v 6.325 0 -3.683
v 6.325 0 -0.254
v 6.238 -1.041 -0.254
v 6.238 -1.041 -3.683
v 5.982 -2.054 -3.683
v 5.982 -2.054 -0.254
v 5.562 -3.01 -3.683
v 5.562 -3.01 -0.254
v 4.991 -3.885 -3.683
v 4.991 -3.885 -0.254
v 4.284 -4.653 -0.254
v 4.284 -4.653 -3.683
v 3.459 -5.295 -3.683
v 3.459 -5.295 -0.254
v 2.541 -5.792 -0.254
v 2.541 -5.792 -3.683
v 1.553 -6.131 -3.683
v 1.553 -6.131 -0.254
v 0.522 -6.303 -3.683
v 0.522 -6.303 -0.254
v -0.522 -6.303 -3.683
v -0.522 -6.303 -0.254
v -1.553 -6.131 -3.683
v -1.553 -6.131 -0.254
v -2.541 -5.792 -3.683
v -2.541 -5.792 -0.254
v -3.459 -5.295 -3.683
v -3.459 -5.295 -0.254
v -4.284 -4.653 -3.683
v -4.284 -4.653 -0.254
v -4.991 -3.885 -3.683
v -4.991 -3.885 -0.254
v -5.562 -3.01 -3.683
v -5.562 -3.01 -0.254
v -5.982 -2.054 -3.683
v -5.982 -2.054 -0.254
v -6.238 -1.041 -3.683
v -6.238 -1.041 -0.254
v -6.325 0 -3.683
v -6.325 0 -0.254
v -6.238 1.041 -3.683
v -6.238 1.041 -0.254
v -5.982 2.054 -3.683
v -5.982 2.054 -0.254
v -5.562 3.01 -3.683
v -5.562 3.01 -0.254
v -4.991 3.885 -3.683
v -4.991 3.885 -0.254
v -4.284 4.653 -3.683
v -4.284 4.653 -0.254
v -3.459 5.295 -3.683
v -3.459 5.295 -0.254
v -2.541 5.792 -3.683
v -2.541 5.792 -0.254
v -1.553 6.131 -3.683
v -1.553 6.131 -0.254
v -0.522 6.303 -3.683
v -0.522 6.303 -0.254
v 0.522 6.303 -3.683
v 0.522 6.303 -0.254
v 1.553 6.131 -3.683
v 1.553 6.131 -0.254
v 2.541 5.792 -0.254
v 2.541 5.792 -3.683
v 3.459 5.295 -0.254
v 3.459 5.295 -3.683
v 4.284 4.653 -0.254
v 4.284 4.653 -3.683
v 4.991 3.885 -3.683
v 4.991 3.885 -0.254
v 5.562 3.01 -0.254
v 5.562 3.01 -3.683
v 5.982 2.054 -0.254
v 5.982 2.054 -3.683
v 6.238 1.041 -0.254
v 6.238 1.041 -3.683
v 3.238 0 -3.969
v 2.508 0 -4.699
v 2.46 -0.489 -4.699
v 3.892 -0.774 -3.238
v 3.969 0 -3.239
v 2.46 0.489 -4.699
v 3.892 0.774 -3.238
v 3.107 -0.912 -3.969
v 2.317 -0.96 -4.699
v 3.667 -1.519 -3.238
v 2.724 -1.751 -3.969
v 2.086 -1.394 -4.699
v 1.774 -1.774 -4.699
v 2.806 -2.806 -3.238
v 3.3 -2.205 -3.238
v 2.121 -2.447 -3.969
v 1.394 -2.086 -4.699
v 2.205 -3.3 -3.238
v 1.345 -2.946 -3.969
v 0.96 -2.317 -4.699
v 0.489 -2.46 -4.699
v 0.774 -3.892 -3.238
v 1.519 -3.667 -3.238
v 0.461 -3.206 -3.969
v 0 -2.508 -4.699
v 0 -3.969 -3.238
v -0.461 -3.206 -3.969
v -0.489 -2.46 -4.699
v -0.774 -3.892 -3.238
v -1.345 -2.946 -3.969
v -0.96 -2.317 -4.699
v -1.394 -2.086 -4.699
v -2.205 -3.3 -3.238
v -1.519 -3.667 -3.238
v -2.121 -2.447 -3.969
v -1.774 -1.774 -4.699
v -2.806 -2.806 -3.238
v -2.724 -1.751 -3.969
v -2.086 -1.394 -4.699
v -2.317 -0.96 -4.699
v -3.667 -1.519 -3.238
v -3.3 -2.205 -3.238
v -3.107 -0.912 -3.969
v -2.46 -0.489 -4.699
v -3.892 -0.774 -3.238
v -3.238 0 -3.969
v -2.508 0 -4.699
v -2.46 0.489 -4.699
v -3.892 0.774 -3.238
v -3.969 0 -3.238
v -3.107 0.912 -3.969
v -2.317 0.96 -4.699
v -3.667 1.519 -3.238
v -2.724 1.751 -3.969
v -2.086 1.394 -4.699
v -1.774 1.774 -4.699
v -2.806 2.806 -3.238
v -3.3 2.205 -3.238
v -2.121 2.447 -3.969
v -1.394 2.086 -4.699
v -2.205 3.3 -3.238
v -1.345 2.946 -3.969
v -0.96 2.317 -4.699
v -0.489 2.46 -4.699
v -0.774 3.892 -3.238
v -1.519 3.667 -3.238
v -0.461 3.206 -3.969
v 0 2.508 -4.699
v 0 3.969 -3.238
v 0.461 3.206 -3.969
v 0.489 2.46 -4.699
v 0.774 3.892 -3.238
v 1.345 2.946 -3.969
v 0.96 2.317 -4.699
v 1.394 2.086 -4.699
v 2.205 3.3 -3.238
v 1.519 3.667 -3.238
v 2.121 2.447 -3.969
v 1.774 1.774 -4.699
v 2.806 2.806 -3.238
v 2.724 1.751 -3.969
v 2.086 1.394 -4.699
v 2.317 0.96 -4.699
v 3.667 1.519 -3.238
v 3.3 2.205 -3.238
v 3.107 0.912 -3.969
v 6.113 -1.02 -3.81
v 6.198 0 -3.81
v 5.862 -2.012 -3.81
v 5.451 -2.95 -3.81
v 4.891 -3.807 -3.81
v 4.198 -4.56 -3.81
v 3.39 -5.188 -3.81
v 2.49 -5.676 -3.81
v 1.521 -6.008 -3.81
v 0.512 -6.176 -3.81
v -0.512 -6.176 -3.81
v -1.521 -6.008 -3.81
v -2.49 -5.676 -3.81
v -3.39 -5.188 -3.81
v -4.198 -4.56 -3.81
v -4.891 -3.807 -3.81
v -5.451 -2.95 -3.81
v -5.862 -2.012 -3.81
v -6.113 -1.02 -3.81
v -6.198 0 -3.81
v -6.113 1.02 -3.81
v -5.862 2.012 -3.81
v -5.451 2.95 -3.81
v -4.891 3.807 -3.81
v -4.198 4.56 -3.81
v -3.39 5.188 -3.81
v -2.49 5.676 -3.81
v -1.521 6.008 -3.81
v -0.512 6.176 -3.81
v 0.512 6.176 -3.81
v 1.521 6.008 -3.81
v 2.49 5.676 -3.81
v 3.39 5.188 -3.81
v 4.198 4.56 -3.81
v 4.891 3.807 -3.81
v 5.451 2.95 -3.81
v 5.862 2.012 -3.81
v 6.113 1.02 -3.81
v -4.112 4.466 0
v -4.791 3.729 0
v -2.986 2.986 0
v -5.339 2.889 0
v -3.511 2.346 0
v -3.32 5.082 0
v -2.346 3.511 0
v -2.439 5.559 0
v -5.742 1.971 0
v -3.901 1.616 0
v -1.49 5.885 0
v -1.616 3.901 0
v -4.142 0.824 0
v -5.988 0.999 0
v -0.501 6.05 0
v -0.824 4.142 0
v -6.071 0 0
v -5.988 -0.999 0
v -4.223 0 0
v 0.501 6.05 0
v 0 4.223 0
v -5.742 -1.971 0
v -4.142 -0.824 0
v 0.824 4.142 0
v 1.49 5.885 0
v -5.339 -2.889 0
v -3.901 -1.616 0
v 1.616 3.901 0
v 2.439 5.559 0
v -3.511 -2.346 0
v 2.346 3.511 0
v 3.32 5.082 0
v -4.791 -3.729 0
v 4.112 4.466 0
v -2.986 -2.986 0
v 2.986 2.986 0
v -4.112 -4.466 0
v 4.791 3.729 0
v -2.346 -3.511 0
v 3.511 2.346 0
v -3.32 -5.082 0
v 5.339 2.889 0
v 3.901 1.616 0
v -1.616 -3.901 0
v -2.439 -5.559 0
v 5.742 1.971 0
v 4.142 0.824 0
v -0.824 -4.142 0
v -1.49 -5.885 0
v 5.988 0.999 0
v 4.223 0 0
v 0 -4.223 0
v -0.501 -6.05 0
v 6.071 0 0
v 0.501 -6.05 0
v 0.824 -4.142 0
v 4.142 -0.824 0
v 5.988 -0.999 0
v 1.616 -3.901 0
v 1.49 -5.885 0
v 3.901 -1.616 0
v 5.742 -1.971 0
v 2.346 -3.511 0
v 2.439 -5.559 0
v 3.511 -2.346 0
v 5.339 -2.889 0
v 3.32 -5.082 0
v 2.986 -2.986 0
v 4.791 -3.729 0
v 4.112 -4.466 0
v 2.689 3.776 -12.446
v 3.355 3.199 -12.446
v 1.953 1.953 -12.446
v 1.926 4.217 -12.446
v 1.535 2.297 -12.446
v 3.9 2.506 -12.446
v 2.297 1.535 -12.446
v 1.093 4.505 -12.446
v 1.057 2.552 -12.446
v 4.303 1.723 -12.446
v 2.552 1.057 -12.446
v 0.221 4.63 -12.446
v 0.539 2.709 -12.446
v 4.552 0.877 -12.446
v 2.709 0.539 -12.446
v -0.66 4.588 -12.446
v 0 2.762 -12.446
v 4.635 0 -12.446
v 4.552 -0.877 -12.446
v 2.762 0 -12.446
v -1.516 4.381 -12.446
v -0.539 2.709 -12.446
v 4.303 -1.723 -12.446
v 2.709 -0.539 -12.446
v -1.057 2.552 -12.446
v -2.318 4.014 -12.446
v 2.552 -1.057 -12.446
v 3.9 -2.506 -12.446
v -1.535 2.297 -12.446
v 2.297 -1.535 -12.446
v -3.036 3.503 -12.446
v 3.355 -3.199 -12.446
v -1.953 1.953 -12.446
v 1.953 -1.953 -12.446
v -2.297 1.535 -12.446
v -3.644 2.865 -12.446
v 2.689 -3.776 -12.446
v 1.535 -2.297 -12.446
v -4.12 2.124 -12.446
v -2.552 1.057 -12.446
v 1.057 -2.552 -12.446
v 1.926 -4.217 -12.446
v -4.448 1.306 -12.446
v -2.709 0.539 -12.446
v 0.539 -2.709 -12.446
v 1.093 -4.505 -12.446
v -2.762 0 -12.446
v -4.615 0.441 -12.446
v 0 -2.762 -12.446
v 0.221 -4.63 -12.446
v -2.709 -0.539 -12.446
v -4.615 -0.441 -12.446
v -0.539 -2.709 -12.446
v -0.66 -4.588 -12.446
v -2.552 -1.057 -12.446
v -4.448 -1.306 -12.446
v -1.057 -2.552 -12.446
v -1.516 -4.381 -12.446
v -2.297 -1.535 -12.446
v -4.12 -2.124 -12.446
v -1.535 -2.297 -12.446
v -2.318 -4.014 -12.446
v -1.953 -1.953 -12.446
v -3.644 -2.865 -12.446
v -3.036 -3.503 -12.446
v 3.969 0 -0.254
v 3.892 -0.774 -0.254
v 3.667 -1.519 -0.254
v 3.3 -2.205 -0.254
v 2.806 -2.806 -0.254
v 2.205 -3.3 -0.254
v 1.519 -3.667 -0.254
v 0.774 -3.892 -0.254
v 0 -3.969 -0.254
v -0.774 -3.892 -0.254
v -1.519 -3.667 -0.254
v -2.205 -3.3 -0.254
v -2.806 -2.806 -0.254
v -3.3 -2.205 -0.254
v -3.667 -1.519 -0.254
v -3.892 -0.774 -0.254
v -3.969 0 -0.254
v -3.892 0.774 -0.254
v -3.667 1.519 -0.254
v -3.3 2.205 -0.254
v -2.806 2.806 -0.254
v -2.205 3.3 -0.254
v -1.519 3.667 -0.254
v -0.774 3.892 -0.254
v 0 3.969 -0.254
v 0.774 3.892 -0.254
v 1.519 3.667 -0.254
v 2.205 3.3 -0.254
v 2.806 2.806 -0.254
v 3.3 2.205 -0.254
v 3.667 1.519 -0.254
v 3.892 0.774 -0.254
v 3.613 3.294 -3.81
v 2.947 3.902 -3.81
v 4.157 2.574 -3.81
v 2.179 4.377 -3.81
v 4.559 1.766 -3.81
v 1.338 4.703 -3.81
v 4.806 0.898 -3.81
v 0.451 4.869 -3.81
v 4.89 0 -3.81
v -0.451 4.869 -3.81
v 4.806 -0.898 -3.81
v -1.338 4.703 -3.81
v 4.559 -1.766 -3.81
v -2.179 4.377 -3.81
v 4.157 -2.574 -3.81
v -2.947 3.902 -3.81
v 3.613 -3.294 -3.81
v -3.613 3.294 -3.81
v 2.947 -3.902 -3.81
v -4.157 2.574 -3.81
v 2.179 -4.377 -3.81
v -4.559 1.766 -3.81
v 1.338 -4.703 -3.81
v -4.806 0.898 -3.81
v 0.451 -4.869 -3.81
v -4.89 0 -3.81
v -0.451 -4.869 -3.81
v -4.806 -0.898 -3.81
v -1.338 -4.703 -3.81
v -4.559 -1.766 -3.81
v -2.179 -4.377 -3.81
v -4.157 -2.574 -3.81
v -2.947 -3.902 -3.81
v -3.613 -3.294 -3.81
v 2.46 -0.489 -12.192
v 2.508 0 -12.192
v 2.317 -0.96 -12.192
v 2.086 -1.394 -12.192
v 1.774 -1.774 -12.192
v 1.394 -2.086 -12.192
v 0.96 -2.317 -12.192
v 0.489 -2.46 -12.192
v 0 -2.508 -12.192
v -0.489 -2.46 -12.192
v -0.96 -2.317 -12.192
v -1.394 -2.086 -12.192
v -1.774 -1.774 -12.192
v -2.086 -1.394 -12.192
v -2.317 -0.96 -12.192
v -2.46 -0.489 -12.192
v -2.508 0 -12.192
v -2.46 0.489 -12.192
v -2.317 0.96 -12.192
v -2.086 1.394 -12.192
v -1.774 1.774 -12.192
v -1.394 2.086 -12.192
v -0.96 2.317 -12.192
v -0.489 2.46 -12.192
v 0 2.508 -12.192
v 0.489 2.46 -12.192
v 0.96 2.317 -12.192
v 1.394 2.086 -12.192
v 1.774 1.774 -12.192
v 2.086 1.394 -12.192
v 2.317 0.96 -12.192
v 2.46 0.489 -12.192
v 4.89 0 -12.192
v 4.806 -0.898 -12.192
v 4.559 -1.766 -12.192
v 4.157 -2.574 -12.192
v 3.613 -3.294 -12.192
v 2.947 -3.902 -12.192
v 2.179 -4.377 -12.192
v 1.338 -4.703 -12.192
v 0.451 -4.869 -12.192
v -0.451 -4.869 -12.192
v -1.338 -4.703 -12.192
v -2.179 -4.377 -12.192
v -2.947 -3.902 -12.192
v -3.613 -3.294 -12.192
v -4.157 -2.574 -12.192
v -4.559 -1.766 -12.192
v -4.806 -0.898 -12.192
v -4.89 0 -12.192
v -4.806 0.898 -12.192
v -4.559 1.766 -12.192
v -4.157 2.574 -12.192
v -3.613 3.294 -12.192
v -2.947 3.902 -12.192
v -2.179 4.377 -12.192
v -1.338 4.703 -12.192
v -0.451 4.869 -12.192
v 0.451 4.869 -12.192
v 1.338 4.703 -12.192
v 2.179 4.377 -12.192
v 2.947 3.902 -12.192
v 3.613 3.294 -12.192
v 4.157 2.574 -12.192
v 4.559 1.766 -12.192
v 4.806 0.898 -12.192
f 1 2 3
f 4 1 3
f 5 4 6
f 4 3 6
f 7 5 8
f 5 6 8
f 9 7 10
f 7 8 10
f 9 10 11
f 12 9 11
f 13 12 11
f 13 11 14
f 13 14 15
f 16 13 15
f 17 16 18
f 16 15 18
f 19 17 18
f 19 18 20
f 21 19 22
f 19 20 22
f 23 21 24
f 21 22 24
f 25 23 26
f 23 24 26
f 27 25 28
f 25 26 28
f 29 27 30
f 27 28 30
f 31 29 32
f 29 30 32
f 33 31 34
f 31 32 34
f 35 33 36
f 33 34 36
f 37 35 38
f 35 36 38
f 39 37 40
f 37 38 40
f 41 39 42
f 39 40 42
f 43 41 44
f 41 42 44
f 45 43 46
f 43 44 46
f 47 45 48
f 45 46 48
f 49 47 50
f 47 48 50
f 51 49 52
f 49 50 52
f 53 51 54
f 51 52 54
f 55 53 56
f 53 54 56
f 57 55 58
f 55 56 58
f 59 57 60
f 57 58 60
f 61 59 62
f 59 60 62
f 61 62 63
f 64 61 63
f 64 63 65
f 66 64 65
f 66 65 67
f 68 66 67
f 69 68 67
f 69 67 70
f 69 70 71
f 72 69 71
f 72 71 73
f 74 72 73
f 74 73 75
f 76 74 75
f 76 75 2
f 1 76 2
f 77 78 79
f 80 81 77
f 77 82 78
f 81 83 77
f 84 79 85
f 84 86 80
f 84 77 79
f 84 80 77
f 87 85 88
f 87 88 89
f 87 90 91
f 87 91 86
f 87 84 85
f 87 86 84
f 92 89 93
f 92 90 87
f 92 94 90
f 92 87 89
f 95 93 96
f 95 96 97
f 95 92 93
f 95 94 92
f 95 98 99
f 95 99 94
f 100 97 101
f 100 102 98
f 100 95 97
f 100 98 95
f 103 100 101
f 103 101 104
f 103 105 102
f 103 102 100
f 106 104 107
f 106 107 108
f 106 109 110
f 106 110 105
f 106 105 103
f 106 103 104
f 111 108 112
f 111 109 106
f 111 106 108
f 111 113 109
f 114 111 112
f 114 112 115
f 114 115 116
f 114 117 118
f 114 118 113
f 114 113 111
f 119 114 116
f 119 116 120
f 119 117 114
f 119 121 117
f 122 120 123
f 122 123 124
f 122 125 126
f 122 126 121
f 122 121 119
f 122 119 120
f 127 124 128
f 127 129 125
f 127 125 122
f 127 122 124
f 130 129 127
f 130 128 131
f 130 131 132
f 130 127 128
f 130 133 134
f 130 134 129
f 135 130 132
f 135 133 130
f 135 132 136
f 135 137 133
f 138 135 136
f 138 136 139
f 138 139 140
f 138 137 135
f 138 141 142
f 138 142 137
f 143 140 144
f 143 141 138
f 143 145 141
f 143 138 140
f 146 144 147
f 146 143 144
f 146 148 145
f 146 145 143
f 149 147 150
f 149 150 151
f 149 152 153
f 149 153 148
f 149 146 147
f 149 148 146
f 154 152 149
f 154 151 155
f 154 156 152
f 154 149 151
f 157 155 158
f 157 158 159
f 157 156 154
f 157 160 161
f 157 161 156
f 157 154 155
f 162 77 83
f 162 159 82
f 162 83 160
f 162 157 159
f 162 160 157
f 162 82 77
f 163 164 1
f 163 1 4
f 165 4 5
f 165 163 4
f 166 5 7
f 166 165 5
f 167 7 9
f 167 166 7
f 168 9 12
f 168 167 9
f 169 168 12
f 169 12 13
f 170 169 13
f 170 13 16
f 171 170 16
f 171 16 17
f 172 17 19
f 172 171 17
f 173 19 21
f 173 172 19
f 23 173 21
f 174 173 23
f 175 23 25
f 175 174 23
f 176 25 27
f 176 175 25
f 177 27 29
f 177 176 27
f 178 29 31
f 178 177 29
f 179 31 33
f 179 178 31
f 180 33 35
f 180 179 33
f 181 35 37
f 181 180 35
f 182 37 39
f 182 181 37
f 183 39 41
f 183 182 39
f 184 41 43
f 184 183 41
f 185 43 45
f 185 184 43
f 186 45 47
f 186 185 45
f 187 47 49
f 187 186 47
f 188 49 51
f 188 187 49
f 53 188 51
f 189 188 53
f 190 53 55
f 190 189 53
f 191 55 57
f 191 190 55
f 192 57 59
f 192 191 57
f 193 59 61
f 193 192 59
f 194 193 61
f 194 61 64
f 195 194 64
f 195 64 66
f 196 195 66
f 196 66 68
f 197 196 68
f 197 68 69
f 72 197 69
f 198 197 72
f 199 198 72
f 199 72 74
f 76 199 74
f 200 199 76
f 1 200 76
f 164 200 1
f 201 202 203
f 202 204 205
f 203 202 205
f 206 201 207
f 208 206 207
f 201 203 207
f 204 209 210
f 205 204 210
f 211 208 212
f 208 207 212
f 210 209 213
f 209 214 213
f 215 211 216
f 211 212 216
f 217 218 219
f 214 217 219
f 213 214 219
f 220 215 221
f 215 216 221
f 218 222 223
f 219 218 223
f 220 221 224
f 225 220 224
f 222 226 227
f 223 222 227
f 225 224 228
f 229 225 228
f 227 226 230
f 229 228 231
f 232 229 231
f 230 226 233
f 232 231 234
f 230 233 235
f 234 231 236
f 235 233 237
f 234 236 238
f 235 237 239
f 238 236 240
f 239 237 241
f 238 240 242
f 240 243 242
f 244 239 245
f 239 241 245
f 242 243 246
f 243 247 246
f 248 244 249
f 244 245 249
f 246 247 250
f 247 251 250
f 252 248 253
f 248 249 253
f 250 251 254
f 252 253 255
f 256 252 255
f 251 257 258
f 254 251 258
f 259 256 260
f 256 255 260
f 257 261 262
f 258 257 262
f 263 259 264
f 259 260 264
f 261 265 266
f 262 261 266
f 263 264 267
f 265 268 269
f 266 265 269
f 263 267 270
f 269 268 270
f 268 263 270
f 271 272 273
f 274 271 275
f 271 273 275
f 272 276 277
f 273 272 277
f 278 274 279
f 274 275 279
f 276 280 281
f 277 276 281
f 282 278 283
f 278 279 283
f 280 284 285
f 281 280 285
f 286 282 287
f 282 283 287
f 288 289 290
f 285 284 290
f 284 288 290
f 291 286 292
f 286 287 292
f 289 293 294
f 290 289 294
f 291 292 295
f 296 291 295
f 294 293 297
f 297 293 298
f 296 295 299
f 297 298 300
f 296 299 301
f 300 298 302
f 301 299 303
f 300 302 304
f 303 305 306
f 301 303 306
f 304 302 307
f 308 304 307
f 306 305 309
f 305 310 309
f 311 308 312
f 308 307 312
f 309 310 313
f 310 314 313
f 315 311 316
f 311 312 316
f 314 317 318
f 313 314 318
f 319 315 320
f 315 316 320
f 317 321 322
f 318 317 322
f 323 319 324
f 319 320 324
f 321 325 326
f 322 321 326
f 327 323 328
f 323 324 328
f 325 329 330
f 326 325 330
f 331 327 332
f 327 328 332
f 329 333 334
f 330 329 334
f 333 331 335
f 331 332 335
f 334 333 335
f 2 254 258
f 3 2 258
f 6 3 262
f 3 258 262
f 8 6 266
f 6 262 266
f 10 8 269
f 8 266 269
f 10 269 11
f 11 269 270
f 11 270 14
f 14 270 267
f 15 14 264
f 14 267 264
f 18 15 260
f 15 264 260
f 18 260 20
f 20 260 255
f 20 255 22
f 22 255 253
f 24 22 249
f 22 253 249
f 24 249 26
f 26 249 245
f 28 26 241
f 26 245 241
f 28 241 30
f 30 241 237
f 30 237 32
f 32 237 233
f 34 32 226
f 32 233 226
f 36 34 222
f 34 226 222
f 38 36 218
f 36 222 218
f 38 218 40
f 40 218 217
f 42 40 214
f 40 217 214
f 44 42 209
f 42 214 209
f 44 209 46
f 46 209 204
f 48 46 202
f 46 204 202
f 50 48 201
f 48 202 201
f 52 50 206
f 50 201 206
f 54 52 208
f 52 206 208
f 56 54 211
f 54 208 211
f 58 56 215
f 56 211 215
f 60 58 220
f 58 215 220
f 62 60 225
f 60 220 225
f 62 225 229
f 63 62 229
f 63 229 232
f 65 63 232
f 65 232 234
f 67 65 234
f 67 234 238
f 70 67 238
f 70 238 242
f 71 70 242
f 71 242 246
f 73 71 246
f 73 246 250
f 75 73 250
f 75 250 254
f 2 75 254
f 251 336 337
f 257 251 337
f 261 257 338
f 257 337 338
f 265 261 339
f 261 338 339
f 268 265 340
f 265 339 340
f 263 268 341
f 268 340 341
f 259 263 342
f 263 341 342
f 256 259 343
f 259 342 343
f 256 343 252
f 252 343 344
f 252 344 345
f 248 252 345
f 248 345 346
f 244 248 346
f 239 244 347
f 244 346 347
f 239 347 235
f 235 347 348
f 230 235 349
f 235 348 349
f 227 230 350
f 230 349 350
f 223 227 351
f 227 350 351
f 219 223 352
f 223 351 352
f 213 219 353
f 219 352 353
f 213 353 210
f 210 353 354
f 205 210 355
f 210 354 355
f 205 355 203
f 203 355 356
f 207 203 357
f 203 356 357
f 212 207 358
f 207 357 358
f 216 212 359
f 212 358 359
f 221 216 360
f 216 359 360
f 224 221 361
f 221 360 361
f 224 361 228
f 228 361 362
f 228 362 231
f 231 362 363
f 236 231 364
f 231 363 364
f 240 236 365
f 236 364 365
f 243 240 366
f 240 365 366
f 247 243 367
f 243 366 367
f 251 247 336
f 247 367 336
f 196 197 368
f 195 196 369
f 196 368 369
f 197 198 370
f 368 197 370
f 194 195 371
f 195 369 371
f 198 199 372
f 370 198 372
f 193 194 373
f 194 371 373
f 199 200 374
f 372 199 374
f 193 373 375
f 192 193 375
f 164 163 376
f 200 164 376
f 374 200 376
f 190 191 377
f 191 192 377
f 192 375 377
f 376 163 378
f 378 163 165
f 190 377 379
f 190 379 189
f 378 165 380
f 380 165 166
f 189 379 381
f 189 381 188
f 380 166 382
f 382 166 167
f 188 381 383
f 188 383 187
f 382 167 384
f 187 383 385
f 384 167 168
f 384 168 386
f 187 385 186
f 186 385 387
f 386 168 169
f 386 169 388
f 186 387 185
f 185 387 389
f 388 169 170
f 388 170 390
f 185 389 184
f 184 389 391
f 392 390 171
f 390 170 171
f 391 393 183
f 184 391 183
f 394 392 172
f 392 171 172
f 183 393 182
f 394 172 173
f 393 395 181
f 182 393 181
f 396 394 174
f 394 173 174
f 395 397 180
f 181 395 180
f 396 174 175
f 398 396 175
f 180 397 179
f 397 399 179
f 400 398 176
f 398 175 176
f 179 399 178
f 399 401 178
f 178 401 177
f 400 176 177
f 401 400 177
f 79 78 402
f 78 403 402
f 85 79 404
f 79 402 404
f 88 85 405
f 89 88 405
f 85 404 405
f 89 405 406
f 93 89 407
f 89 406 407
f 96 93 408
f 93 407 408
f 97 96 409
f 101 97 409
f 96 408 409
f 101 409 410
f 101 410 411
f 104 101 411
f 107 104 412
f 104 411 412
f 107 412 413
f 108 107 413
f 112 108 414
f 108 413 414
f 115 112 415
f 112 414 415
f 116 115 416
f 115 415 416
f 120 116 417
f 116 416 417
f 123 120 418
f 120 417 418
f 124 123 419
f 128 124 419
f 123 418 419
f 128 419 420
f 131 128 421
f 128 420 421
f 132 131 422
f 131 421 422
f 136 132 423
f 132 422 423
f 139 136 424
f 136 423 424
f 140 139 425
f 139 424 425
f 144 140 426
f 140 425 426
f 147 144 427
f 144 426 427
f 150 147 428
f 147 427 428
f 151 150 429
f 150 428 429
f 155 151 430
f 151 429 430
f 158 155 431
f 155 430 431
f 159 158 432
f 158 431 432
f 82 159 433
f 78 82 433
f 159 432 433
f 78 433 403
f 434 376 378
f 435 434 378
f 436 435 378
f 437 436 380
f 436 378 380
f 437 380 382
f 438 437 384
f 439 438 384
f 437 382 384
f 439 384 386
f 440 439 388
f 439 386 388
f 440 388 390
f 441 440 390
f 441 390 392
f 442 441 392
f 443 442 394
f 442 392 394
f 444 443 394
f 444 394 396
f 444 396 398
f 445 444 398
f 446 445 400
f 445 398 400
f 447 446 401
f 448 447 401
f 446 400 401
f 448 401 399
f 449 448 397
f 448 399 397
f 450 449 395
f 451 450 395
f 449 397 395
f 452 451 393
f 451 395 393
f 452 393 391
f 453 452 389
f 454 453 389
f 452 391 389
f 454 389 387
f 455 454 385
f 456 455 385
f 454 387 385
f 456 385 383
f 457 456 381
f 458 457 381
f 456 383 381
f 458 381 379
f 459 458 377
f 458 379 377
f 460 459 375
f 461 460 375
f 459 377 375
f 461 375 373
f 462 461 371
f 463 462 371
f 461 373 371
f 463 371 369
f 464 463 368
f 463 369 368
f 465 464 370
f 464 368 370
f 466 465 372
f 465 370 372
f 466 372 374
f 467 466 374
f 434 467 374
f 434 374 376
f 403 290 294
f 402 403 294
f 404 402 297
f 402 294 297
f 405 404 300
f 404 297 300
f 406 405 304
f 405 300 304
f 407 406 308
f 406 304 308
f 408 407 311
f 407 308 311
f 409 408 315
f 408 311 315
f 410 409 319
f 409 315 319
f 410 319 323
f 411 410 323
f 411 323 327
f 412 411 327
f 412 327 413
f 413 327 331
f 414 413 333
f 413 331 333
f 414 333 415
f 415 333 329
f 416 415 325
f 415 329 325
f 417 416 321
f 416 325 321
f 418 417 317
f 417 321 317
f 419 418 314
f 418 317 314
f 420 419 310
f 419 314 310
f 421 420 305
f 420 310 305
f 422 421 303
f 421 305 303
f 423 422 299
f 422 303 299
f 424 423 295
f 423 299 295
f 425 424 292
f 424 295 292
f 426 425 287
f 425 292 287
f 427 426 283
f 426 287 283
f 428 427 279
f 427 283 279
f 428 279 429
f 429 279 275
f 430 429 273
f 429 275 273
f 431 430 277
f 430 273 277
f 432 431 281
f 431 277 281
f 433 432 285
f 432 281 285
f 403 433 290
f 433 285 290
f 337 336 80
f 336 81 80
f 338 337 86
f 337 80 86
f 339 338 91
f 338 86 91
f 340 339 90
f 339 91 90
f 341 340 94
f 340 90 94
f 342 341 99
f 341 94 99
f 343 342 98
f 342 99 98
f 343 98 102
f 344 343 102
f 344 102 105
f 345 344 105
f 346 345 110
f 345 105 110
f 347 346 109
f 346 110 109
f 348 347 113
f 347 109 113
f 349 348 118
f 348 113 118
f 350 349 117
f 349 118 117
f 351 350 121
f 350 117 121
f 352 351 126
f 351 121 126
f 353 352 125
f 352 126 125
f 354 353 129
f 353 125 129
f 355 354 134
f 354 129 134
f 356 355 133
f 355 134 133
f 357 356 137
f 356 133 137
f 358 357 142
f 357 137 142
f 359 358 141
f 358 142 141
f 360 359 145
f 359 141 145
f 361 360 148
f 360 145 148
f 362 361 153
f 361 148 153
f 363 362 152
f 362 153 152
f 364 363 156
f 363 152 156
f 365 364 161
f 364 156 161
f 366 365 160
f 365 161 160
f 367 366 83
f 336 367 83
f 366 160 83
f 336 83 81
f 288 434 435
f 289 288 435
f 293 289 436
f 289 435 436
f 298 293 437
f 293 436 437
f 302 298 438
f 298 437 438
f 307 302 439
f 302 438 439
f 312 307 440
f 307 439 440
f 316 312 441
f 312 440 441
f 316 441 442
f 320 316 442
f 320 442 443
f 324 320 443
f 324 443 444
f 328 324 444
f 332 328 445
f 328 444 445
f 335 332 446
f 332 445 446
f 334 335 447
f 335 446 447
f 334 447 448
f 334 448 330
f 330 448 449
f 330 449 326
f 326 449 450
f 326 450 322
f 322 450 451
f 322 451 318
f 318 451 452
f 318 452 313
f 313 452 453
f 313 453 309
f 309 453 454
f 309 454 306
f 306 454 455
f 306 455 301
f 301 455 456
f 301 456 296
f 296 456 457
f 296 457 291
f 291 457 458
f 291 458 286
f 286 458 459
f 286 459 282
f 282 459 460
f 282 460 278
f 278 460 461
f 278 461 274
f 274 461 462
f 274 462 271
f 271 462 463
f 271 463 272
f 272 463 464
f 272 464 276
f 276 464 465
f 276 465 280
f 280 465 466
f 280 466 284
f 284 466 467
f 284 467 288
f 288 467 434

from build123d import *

# Parameters (mm, degrees)
F2_SIZE     = 0.254
F3_S5_R     = 3.96875
F3_T6_DEPTH = 9
F4_SIZE     = 0.127


# Not quite as in the source:
# - a fillet or chamfer that OpenCascade refuses, or shapes differently, is made with other operations: its cross-section is extruded or revolved along the edge and cut away or added


with BuildPart() as f1:
    # F0 (on Front) → F1 (revolve)
    with BuildSketch(Plane.XZ):
        Polygon((6.3246, -3.81), (6.3246, 0), (3.96875, 0), (3.96875, -2.159), (2.50825, -2.159), (2.50825, -12.446), (4.8895, -12.446), (4.8895, -3.81), align=None)
    revolve(axis=Axis((0, 0, -10.7170343399), (0, 0, -1)))

    # F2
    f2_edges = [f1.edges().sort_by_distance(p)[0] for p in [
        (-6.3246, 0, 0),
        (-4.8895, 0, -12.446),
        (-2.50825, 0, -12.446),
        (-3.96875, 0, 0),
    ]]
    chamfer(f2_edges, length=F2_SIZE)

    # F3: chamfer of 2.54 on 1 edges, made by hand


with BuildPart() as f3_tool2:
    # F3_s3 → F3_t4 (revolve)
    with BuildSketch(Plane.XZ):
        Polygon((2.50825, -4.699), (5.04825, -2.159), (2.50825, -2.159), align=None)
    revolve(axis=Axis((0, 0, -2.159), (0, 0, -1)))

    # F3_s5 → F3_t6 (intersect, symmetric)
    with BuildSketch(Plane.XY.offset(-3.4)):
        Circle(F3_S5_R)
    extrude(amount=F3_T6_DEPTH, both=True, mode=Mode.INTERSECT)


with BuildPart() as f1_1:
    add(f1.part)

    # F3_t1: cut F3_tool2
    add(f3_tool2.part, mode=Mode.SUBTRACT)

    # F4
    f4_edges = [f1_1.edges().sort_by_distance(p)[0] for p in [
        (-6.3246, 0, -3.81),
    ]]
    chamfer(f4_edges, length=F4_SIZE)


solid = f1_1.part
